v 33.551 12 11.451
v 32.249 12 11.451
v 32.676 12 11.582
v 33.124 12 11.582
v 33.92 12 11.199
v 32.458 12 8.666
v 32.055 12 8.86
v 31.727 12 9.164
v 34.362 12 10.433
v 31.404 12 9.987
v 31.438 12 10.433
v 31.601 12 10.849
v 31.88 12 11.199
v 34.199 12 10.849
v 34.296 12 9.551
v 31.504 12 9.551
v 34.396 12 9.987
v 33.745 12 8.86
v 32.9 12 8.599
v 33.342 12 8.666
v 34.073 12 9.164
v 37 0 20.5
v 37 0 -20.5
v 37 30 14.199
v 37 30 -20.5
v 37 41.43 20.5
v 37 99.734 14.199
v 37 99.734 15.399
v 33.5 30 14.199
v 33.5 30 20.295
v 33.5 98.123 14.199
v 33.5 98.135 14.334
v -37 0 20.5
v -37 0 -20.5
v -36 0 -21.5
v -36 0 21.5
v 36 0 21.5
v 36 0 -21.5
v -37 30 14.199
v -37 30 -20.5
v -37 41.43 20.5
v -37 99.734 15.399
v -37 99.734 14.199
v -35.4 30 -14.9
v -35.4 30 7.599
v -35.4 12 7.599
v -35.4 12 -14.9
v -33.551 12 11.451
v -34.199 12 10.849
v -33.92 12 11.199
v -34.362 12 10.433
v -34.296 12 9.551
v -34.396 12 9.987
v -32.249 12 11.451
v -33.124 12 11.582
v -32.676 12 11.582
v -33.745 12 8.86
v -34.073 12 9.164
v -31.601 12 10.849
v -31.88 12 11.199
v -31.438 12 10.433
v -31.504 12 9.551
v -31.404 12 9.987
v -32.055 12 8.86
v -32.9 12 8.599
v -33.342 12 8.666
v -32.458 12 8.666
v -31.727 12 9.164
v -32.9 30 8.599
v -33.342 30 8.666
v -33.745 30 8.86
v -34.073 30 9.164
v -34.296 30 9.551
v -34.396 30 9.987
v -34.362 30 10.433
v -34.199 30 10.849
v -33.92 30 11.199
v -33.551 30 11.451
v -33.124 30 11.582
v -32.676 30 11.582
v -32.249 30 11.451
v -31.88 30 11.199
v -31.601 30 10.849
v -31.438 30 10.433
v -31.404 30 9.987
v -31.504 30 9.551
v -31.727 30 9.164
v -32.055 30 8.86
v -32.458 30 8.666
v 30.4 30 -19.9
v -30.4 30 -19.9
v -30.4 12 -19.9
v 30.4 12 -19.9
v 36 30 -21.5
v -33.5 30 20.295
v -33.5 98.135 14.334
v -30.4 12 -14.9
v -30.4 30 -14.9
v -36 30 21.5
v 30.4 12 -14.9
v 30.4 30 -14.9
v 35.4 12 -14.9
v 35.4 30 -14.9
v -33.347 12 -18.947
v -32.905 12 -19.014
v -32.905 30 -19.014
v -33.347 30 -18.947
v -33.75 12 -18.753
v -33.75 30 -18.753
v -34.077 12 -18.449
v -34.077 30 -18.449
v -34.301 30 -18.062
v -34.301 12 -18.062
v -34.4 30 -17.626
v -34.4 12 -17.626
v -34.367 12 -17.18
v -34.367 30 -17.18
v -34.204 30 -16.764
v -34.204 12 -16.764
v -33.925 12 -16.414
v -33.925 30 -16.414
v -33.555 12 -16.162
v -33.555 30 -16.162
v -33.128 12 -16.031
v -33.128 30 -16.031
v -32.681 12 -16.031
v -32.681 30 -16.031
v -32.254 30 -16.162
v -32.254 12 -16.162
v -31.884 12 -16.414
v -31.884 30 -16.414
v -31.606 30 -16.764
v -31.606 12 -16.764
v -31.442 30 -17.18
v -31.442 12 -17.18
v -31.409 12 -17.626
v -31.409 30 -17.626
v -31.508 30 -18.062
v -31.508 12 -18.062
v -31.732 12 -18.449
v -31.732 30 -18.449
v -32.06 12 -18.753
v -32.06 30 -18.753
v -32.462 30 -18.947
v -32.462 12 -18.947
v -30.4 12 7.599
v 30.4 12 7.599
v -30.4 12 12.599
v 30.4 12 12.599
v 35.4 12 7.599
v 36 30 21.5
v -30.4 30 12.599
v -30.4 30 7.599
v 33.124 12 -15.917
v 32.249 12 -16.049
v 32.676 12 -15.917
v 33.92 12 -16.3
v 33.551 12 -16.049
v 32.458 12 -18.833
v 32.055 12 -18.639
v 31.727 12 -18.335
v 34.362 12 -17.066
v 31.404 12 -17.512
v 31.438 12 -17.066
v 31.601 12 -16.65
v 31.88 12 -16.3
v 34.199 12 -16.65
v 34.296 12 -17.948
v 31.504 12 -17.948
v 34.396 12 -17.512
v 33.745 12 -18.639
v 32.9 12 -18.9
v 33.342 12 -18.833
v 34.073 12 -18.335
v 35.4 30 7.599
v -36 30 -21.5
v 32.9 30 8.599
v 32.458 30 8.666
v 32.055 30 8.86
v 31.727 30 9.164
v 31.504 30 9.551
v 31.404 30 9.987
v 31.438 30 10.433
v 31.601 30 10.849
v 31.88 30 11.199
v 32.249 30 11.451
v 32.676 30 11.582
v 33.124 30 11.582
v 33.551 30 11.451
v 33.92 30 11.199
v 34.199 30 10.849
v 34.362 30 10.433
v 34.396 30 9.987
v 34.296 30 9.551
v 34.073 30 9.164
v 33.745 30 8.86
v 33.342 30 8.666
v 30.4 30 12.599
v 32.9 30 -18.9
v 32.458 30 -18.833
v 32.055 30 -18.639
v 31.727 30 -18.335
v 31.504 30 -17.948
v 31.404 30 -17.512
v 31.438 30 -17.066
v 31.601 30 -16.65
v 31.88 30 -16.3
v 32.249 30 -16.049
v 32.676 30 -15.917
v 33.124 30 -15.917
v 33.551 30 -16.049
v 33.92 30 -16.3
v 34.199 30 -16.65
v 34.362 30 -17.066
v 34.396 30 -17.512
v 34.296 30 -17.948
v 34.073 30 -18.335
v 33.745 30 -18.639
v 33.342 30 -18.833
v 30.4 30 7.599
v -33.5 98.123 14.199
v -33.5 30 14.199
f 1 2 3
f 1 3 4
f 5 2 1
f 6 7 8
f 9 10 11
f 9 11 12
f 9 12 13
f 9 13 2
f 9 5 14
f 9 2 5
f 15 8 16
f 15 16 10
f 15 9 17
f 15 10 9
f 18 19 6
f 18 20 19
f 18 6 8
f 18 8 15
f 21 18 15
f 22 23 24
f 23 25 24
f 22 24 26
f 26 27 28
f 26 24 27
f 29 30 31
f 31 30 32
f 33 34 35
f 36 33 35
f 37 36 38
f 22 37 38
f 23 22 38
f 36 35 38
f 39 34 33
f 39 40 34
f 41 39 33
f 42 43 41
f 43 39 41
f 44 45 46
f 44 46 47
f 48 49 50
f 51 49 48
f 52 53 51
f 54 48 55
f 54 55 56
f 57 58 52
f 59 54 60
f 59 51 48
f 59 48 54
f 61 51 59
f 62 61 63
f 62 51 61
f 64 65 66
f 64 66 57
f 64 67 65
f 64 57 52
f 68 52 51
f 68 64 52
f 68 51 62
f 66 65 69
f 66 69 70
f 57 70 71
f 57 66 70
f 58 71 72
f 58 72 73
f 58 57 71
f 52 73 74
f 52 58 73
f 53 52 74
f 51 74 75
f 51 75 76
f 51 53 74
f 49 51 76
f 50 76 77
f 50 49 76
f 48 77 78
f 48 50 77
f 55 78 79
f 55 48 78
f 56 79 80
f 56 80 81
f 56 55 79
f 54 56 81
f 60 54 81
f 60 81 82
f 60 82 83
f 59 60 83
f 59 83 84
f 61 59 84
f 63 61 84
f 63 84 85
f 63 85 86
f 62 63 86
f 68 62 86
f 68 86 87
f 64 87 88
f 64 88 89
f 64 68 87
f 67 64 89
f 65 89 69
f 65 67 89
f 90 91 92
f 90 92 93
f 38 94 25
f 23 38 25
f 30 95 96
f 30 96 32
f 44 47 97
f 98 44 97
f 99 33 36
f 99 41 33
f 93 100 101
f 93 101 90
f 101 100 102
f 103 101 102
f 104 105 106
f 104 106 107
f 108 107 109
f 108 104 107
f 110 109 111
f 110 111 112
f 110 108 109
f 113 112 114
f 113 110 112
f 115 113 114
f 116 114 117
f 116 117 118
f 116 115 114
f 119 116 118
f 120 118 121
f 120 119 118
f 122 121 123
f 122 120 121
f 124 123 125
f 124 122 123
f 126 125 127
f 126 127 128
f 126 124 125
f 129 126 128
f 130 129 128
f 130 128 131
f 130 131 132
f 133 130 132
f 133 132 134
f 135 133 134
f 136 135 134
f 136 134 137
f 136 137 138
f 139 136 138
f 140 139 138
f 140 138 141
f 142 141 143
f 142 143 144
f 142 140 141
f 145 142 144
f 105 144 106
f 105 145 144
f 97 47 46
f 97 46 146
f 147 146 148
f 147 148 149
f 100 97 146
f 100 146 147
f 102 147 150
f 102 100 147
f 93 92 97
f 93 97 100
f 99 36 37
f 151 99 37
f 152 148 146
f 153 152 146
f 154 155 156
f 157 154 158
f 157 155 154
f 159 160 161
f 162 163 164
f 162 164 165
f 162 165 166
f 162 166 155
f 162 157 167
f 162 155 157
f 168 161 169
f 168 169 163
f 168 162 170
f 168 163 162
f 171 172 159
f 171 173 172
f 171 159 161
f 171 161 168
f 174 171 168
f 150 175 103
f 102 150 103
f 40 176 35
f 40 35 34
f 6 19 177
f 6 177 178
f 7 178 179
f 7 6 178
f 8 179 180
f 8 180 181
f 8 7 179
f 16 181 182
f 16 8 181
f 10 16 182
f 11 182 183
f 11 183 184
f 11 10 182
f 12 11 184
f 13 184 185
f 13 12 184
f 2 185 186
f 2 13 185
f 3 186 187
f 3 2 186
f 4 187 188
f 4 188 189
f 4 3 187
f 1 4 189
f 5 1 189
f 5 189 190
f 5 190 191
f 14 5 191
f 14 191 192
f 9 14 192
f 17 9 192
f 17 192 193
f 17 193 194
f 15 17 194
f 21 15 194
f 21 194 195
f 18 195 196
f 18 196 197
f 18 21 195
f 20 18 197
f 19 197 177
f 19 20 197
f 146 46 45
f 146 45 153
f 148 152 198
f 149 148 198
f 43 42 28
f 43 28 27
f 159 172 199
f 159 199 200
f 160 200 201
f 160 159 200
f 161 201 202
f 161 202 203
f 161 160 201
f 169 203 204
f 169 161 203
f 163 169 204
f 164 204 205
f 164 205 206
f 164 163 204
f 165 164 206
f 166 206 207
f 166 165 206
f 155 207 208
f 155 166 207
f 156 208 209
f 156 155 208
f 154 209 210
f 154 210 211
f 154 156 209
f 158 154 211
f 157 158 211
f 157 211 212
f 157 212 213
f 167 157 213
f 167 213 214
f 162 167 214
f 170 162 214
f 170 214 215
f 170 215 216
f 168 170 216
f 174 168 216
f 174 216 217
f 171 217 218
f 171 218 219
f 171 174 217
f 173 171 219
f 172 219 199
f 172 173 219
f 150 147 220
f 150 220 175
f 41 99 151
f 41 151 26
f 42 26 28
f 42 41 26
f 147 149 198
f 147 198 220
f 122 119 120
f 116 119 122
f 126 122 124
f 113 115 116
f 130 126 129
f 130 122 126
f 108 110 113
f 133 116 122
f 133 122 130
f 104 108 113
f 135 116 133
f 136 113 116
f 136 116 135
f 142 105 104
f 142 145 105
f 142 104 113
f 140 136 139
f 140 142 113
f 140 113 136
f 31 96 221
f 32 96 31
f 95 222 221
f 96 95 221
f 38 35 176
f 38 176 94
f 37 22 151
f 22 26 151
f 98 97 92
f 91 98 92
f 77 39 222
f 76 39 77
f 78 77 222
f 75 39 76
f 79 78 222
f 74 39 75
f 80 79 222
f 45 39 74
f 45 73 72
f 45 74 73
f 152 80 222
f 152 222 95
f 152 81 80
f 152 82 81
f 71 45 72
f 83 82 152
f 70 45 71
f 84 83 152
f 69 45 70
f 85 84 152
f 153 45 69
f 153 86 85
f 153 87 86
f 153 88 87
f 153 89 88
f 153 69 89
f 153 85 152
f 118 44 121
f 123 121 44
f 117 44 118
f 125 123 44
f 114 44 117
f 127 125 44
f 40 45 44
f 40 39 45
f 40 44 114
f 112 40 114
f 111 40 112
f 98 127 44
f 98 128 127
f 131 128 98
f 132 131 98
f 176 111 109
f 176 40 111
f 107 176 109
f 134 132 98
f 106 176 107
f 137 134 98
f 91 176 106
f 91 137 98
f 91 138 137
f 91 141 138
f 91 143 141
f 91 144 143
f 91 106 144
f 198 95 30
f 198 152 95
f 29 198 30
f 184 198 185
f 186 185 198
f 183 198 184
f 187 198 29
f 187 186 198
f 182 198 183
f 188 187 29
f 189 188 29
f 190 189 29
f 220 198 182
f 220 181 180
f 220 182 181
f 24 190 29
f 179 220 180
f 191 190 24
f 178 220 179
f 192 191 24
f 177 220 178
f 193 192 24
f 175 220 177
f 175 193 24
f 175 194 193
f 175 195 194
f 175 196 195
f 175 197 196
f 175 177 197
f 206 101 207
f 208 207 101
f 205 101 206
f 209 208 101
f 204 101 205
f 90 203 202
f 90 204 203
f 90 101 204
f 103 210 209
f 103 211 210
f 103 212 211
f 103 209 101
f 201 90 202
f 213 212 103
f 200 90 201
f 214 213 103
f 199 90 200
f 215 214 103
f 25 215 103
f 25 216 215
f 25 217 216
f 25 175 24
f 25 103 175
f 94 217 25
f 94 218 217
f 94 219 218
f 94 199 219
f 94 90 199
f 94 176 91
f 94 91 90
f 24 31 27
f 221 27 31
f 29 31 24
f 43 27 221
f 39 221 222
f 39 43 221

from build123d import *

# Parameters (mm, degrees)
SKETCH_1_W          = 74
SKETCH_1_H          = 43
EXTRUDE_1_DEPTH     = 30
EXTRUDE_4_DEPTH     = 74
CUT_EXTRUDE_2_REACH = 115.492
SKETCH_8_W          = 67
SKETCH_8_H          = 67
SKETCH_10_W         = 70.8
SKETCH_10_H         = 32.499098008
CUT_EXTRUDE_3_DEPTH = 18
CUT_EXTRUDE_5_REACH = 114.206
SKETCH_11_W         = 67
SKETCH_11_H         = 1.389705156
SKETCH_12_W         = 5
SKETCH_12_H         = 5
SKETCH_12_R         = 1.5
EXTRUDE_6_DEPTH     = 18
CHAMFER_1_SIZE      = 1


with BuildPart() as part:
    # 草图1 → 凸台-拉伸1 (new body)
    with BuildSketch(Plane(origin=(0, 0, 0), x_dir=(1, 0, 0), z_dir=(0, 1, 0))):
        Rectangle(SKETCH_1_W, SKETCH_1_H)
    extrude(amount=EXTRUDE_1_DEPTH)

    # 草图7 → 凸台-拉伸4 (add, through all)
    with BuildSketch(Plane.ZY.offset(37)):
        Polygon((21.5, 30), (15.399098008, 99.733628866), (14.199098008, 99.733628866), (14.199098008, 30), align=None)
    extrude(amount=-EXTRUDE_4_DEPTH)

    # 切除-拉伸2: up to this plane
    cut_extrude_2_end = Plane(origin=(37, 99.733628866, 14.199098008), z_dir=(0, 0, -1))
    # 草图8 → 切除-拉伸2 (cut, up to the surface)
    with BuildSketch(Plane(origin=(0, 1.990014723, 22.745972372), x_dir=(1, 0, 0), z_dir=(0, 0.08715574274766194, 0.9961946980917453)), mode=Mode.PRIVATE) as cut_extrude_2_sk1:
        with Locations((0, 63.011992474)):
            Rectangle(SKETCH_8_W, SKETCH_8_H)
    cut_extrude_2_tool1 = split(extrude(cut_extrude_2_sk1.sketch, amount=-CUT_EXTRUDE_2_REACH, mode=Mode.PRIVATE), bisect_by=cut_extrude_2_end, keep=Keep.BOTH, mode=Mode.PRIVATE)
    add(cut_extrude_2_tool1.solids().sort_by_distance((0, 64.762228, 17.254115))[0], mode=Mode.SUBTRACT)

    # 草图10 → 切除-拉伸3 (cut)
    with BuildSketch(Plane(origin=(0, 30, 0), x_dir=(1, 0, 0), z_dir=(0, 1, 0))):
        with Locations((0, 3.650450996)):
            Rectangle(SKETCH_10_W, SKETCH_10_H)
    extrude(amount=-CUT_EXTRUDE_3_DEPTH, mode=Mode.SUBTRACT)

    # 切除-拉伸5: up to this face of the body (flat: up to its plane)
    cut_extrude_5_end = Plane(part.part.faces().sort_by_distance((0, 64.762227542, 17.254115366))[0])
    # 草图11 → 切除-拉伸5 (cut, up to the picked face)
    with BuildSketch(Plane(origin=(0, 0, 14.199098008), x_dir=(-1, 0, 0), z_dir=(0, 0, -1)), mode=Mode.PRIVATE) as cut_extrude_5_sk1:
        with Locations((0, 30.694852578)):
            Rectangle(SKETCH_11_W, SKETCH_11_H)
    cut_extrude_5_tool1 = split(extrude(cut_extrude_5_sk1.sketch, amount=-CUT_EXTRUDE_5_REACH, mode=Mode.PRIVATE), bisect_by=cut_extrude_5_end, keep=Keep.BOTH, mode=Mode.PRIVATE)
    add(cut_extrude_5_tool1.solids().sort_by(Axis((0, 30.694853, 14.199098), (0, 0, 1)))[0], mode=Mode.SUBTRACT)

    # 草图12 → 凸台-拉伸6 (add)
    # profile 1 of 4: a face of its own
    with BuildSketch(Plane(origin=(0, 12, 0), x_dir=(1, 0, 0), z_dir=(0, 1, 0))):
        with Locations((-32.9, 17.4)):
            Rectangle(SKETCH_12_W, SKETCH_12_H)
        with Locations(Location((-32.904560765, 17.513886845, 0), (0, 0, 90))):
            Circle(SKETCH_12_R, mode=Mode.SUBTRACT)
    # profile 2 of 4: a face of its own
    with BuildSketch(Plane(origin=(0, 12, 0), x_dir=(1, 0, 0), z_dir=(0, 1, 0))):
        with Locations((32.9, 17.4)):
            Rectangle(SKETCH_12_W, SKETCH_12_H)
        with Locations(Location((32.9, 17.4, 0), (0, 0, 90))):
            Circle(SKETCH_12_R, mode=Mode.SUBTRACT)
    # profile 3 of 4: a face of its own
    with BuildSketch(Plane(origin=(0, 12, 0), x_dir=(1, 0, 0), z_dir=(0, 1, 0))):
        with Locations((-32.9, -10.099098008)):
            Rectangle(SKETCH_12_W, SKETCH_12_H)
        with Locations(Location((-32.9, -10.099098008, 0), (0, 0, 90))):
            Circle(SKETCH_12_R, mode=Mode.SUBTRACT)
    # profile 4 of 4: a face of its own
    with BuildSketch(Plane(origin=(0, 12, 0), x_dir=(1, 0, 0), z_dir=(0, 1, 0))):
        with Locations((32.9, -10.099098008)):
            Rectangle(SKETCH_12_W, SKETCH_12_H)
        with Locations(Location((32.9, -10.099098008, 0), (0, 0, 90))):
            Circle(SKETCH_12_R, mode=Mode.SUBTRACT)
    extrude(amount=EXTRUDE_6_DEPTH)

    # 倒角1
    # the kernel refuses this chamfer: 1 mm, written as the material it takes off along each edge
    with BuildSketch(Plane(origin=(37, -2.571682988, 21.5), x_dir=(0, 0, -1), z_dir=(0, 1, 0))) as chamfer_1_piece_1:
        Polygon((CHAMFER_1_SIZE, 0), (0, CHAMFER_1_SIZE), (0, 0), align=None)
    extrude(amount=45.430097928, mode=Mode.SUBTRACT)
    with BuildSketch(Plane(origin=(-37, -2.571682988, 21.5), x_dir=(0, 0, -1), z_dir=(0, 1, 0))) as chamfer_1_piece_2:
        Polygon((CHAMFER_1_SIZE, 0), (0, -CHAMFER_1_SIZE), (0, 0), align=None)
    extrude(amount=45.430097928, mode=Mode.SUBTRACT)
    with BuildSketch(Plane(origin=(-37, -2.571682988, -21.5), x_dir=(1, 0, 0), z_dir=(0, 1, 0))) as chamfer_1_piece_3:
        Polygon((CHAMFER_1_SIZE, 0), (0, -CHAMFER_1_SIZE), (0, 0), align=None)
    extrude(amount=35.143365976, mode=Mode.SUBTRACT)
    with BuildSketch(Plane(origin=(37, -2.571682988, -21.5), x_dir=(-1, 0, 0), z_dir=(0, 1, 0))) as chamfer_1_piece_4:
        Polygon((CHAMFER_1_SIZE, 0), (0, CHAMFER_1_SIZE), (0, 0), align=None)
    extrude(amount=35.143365976, mode=Mode.SUBTRACT)


solid = part.part
